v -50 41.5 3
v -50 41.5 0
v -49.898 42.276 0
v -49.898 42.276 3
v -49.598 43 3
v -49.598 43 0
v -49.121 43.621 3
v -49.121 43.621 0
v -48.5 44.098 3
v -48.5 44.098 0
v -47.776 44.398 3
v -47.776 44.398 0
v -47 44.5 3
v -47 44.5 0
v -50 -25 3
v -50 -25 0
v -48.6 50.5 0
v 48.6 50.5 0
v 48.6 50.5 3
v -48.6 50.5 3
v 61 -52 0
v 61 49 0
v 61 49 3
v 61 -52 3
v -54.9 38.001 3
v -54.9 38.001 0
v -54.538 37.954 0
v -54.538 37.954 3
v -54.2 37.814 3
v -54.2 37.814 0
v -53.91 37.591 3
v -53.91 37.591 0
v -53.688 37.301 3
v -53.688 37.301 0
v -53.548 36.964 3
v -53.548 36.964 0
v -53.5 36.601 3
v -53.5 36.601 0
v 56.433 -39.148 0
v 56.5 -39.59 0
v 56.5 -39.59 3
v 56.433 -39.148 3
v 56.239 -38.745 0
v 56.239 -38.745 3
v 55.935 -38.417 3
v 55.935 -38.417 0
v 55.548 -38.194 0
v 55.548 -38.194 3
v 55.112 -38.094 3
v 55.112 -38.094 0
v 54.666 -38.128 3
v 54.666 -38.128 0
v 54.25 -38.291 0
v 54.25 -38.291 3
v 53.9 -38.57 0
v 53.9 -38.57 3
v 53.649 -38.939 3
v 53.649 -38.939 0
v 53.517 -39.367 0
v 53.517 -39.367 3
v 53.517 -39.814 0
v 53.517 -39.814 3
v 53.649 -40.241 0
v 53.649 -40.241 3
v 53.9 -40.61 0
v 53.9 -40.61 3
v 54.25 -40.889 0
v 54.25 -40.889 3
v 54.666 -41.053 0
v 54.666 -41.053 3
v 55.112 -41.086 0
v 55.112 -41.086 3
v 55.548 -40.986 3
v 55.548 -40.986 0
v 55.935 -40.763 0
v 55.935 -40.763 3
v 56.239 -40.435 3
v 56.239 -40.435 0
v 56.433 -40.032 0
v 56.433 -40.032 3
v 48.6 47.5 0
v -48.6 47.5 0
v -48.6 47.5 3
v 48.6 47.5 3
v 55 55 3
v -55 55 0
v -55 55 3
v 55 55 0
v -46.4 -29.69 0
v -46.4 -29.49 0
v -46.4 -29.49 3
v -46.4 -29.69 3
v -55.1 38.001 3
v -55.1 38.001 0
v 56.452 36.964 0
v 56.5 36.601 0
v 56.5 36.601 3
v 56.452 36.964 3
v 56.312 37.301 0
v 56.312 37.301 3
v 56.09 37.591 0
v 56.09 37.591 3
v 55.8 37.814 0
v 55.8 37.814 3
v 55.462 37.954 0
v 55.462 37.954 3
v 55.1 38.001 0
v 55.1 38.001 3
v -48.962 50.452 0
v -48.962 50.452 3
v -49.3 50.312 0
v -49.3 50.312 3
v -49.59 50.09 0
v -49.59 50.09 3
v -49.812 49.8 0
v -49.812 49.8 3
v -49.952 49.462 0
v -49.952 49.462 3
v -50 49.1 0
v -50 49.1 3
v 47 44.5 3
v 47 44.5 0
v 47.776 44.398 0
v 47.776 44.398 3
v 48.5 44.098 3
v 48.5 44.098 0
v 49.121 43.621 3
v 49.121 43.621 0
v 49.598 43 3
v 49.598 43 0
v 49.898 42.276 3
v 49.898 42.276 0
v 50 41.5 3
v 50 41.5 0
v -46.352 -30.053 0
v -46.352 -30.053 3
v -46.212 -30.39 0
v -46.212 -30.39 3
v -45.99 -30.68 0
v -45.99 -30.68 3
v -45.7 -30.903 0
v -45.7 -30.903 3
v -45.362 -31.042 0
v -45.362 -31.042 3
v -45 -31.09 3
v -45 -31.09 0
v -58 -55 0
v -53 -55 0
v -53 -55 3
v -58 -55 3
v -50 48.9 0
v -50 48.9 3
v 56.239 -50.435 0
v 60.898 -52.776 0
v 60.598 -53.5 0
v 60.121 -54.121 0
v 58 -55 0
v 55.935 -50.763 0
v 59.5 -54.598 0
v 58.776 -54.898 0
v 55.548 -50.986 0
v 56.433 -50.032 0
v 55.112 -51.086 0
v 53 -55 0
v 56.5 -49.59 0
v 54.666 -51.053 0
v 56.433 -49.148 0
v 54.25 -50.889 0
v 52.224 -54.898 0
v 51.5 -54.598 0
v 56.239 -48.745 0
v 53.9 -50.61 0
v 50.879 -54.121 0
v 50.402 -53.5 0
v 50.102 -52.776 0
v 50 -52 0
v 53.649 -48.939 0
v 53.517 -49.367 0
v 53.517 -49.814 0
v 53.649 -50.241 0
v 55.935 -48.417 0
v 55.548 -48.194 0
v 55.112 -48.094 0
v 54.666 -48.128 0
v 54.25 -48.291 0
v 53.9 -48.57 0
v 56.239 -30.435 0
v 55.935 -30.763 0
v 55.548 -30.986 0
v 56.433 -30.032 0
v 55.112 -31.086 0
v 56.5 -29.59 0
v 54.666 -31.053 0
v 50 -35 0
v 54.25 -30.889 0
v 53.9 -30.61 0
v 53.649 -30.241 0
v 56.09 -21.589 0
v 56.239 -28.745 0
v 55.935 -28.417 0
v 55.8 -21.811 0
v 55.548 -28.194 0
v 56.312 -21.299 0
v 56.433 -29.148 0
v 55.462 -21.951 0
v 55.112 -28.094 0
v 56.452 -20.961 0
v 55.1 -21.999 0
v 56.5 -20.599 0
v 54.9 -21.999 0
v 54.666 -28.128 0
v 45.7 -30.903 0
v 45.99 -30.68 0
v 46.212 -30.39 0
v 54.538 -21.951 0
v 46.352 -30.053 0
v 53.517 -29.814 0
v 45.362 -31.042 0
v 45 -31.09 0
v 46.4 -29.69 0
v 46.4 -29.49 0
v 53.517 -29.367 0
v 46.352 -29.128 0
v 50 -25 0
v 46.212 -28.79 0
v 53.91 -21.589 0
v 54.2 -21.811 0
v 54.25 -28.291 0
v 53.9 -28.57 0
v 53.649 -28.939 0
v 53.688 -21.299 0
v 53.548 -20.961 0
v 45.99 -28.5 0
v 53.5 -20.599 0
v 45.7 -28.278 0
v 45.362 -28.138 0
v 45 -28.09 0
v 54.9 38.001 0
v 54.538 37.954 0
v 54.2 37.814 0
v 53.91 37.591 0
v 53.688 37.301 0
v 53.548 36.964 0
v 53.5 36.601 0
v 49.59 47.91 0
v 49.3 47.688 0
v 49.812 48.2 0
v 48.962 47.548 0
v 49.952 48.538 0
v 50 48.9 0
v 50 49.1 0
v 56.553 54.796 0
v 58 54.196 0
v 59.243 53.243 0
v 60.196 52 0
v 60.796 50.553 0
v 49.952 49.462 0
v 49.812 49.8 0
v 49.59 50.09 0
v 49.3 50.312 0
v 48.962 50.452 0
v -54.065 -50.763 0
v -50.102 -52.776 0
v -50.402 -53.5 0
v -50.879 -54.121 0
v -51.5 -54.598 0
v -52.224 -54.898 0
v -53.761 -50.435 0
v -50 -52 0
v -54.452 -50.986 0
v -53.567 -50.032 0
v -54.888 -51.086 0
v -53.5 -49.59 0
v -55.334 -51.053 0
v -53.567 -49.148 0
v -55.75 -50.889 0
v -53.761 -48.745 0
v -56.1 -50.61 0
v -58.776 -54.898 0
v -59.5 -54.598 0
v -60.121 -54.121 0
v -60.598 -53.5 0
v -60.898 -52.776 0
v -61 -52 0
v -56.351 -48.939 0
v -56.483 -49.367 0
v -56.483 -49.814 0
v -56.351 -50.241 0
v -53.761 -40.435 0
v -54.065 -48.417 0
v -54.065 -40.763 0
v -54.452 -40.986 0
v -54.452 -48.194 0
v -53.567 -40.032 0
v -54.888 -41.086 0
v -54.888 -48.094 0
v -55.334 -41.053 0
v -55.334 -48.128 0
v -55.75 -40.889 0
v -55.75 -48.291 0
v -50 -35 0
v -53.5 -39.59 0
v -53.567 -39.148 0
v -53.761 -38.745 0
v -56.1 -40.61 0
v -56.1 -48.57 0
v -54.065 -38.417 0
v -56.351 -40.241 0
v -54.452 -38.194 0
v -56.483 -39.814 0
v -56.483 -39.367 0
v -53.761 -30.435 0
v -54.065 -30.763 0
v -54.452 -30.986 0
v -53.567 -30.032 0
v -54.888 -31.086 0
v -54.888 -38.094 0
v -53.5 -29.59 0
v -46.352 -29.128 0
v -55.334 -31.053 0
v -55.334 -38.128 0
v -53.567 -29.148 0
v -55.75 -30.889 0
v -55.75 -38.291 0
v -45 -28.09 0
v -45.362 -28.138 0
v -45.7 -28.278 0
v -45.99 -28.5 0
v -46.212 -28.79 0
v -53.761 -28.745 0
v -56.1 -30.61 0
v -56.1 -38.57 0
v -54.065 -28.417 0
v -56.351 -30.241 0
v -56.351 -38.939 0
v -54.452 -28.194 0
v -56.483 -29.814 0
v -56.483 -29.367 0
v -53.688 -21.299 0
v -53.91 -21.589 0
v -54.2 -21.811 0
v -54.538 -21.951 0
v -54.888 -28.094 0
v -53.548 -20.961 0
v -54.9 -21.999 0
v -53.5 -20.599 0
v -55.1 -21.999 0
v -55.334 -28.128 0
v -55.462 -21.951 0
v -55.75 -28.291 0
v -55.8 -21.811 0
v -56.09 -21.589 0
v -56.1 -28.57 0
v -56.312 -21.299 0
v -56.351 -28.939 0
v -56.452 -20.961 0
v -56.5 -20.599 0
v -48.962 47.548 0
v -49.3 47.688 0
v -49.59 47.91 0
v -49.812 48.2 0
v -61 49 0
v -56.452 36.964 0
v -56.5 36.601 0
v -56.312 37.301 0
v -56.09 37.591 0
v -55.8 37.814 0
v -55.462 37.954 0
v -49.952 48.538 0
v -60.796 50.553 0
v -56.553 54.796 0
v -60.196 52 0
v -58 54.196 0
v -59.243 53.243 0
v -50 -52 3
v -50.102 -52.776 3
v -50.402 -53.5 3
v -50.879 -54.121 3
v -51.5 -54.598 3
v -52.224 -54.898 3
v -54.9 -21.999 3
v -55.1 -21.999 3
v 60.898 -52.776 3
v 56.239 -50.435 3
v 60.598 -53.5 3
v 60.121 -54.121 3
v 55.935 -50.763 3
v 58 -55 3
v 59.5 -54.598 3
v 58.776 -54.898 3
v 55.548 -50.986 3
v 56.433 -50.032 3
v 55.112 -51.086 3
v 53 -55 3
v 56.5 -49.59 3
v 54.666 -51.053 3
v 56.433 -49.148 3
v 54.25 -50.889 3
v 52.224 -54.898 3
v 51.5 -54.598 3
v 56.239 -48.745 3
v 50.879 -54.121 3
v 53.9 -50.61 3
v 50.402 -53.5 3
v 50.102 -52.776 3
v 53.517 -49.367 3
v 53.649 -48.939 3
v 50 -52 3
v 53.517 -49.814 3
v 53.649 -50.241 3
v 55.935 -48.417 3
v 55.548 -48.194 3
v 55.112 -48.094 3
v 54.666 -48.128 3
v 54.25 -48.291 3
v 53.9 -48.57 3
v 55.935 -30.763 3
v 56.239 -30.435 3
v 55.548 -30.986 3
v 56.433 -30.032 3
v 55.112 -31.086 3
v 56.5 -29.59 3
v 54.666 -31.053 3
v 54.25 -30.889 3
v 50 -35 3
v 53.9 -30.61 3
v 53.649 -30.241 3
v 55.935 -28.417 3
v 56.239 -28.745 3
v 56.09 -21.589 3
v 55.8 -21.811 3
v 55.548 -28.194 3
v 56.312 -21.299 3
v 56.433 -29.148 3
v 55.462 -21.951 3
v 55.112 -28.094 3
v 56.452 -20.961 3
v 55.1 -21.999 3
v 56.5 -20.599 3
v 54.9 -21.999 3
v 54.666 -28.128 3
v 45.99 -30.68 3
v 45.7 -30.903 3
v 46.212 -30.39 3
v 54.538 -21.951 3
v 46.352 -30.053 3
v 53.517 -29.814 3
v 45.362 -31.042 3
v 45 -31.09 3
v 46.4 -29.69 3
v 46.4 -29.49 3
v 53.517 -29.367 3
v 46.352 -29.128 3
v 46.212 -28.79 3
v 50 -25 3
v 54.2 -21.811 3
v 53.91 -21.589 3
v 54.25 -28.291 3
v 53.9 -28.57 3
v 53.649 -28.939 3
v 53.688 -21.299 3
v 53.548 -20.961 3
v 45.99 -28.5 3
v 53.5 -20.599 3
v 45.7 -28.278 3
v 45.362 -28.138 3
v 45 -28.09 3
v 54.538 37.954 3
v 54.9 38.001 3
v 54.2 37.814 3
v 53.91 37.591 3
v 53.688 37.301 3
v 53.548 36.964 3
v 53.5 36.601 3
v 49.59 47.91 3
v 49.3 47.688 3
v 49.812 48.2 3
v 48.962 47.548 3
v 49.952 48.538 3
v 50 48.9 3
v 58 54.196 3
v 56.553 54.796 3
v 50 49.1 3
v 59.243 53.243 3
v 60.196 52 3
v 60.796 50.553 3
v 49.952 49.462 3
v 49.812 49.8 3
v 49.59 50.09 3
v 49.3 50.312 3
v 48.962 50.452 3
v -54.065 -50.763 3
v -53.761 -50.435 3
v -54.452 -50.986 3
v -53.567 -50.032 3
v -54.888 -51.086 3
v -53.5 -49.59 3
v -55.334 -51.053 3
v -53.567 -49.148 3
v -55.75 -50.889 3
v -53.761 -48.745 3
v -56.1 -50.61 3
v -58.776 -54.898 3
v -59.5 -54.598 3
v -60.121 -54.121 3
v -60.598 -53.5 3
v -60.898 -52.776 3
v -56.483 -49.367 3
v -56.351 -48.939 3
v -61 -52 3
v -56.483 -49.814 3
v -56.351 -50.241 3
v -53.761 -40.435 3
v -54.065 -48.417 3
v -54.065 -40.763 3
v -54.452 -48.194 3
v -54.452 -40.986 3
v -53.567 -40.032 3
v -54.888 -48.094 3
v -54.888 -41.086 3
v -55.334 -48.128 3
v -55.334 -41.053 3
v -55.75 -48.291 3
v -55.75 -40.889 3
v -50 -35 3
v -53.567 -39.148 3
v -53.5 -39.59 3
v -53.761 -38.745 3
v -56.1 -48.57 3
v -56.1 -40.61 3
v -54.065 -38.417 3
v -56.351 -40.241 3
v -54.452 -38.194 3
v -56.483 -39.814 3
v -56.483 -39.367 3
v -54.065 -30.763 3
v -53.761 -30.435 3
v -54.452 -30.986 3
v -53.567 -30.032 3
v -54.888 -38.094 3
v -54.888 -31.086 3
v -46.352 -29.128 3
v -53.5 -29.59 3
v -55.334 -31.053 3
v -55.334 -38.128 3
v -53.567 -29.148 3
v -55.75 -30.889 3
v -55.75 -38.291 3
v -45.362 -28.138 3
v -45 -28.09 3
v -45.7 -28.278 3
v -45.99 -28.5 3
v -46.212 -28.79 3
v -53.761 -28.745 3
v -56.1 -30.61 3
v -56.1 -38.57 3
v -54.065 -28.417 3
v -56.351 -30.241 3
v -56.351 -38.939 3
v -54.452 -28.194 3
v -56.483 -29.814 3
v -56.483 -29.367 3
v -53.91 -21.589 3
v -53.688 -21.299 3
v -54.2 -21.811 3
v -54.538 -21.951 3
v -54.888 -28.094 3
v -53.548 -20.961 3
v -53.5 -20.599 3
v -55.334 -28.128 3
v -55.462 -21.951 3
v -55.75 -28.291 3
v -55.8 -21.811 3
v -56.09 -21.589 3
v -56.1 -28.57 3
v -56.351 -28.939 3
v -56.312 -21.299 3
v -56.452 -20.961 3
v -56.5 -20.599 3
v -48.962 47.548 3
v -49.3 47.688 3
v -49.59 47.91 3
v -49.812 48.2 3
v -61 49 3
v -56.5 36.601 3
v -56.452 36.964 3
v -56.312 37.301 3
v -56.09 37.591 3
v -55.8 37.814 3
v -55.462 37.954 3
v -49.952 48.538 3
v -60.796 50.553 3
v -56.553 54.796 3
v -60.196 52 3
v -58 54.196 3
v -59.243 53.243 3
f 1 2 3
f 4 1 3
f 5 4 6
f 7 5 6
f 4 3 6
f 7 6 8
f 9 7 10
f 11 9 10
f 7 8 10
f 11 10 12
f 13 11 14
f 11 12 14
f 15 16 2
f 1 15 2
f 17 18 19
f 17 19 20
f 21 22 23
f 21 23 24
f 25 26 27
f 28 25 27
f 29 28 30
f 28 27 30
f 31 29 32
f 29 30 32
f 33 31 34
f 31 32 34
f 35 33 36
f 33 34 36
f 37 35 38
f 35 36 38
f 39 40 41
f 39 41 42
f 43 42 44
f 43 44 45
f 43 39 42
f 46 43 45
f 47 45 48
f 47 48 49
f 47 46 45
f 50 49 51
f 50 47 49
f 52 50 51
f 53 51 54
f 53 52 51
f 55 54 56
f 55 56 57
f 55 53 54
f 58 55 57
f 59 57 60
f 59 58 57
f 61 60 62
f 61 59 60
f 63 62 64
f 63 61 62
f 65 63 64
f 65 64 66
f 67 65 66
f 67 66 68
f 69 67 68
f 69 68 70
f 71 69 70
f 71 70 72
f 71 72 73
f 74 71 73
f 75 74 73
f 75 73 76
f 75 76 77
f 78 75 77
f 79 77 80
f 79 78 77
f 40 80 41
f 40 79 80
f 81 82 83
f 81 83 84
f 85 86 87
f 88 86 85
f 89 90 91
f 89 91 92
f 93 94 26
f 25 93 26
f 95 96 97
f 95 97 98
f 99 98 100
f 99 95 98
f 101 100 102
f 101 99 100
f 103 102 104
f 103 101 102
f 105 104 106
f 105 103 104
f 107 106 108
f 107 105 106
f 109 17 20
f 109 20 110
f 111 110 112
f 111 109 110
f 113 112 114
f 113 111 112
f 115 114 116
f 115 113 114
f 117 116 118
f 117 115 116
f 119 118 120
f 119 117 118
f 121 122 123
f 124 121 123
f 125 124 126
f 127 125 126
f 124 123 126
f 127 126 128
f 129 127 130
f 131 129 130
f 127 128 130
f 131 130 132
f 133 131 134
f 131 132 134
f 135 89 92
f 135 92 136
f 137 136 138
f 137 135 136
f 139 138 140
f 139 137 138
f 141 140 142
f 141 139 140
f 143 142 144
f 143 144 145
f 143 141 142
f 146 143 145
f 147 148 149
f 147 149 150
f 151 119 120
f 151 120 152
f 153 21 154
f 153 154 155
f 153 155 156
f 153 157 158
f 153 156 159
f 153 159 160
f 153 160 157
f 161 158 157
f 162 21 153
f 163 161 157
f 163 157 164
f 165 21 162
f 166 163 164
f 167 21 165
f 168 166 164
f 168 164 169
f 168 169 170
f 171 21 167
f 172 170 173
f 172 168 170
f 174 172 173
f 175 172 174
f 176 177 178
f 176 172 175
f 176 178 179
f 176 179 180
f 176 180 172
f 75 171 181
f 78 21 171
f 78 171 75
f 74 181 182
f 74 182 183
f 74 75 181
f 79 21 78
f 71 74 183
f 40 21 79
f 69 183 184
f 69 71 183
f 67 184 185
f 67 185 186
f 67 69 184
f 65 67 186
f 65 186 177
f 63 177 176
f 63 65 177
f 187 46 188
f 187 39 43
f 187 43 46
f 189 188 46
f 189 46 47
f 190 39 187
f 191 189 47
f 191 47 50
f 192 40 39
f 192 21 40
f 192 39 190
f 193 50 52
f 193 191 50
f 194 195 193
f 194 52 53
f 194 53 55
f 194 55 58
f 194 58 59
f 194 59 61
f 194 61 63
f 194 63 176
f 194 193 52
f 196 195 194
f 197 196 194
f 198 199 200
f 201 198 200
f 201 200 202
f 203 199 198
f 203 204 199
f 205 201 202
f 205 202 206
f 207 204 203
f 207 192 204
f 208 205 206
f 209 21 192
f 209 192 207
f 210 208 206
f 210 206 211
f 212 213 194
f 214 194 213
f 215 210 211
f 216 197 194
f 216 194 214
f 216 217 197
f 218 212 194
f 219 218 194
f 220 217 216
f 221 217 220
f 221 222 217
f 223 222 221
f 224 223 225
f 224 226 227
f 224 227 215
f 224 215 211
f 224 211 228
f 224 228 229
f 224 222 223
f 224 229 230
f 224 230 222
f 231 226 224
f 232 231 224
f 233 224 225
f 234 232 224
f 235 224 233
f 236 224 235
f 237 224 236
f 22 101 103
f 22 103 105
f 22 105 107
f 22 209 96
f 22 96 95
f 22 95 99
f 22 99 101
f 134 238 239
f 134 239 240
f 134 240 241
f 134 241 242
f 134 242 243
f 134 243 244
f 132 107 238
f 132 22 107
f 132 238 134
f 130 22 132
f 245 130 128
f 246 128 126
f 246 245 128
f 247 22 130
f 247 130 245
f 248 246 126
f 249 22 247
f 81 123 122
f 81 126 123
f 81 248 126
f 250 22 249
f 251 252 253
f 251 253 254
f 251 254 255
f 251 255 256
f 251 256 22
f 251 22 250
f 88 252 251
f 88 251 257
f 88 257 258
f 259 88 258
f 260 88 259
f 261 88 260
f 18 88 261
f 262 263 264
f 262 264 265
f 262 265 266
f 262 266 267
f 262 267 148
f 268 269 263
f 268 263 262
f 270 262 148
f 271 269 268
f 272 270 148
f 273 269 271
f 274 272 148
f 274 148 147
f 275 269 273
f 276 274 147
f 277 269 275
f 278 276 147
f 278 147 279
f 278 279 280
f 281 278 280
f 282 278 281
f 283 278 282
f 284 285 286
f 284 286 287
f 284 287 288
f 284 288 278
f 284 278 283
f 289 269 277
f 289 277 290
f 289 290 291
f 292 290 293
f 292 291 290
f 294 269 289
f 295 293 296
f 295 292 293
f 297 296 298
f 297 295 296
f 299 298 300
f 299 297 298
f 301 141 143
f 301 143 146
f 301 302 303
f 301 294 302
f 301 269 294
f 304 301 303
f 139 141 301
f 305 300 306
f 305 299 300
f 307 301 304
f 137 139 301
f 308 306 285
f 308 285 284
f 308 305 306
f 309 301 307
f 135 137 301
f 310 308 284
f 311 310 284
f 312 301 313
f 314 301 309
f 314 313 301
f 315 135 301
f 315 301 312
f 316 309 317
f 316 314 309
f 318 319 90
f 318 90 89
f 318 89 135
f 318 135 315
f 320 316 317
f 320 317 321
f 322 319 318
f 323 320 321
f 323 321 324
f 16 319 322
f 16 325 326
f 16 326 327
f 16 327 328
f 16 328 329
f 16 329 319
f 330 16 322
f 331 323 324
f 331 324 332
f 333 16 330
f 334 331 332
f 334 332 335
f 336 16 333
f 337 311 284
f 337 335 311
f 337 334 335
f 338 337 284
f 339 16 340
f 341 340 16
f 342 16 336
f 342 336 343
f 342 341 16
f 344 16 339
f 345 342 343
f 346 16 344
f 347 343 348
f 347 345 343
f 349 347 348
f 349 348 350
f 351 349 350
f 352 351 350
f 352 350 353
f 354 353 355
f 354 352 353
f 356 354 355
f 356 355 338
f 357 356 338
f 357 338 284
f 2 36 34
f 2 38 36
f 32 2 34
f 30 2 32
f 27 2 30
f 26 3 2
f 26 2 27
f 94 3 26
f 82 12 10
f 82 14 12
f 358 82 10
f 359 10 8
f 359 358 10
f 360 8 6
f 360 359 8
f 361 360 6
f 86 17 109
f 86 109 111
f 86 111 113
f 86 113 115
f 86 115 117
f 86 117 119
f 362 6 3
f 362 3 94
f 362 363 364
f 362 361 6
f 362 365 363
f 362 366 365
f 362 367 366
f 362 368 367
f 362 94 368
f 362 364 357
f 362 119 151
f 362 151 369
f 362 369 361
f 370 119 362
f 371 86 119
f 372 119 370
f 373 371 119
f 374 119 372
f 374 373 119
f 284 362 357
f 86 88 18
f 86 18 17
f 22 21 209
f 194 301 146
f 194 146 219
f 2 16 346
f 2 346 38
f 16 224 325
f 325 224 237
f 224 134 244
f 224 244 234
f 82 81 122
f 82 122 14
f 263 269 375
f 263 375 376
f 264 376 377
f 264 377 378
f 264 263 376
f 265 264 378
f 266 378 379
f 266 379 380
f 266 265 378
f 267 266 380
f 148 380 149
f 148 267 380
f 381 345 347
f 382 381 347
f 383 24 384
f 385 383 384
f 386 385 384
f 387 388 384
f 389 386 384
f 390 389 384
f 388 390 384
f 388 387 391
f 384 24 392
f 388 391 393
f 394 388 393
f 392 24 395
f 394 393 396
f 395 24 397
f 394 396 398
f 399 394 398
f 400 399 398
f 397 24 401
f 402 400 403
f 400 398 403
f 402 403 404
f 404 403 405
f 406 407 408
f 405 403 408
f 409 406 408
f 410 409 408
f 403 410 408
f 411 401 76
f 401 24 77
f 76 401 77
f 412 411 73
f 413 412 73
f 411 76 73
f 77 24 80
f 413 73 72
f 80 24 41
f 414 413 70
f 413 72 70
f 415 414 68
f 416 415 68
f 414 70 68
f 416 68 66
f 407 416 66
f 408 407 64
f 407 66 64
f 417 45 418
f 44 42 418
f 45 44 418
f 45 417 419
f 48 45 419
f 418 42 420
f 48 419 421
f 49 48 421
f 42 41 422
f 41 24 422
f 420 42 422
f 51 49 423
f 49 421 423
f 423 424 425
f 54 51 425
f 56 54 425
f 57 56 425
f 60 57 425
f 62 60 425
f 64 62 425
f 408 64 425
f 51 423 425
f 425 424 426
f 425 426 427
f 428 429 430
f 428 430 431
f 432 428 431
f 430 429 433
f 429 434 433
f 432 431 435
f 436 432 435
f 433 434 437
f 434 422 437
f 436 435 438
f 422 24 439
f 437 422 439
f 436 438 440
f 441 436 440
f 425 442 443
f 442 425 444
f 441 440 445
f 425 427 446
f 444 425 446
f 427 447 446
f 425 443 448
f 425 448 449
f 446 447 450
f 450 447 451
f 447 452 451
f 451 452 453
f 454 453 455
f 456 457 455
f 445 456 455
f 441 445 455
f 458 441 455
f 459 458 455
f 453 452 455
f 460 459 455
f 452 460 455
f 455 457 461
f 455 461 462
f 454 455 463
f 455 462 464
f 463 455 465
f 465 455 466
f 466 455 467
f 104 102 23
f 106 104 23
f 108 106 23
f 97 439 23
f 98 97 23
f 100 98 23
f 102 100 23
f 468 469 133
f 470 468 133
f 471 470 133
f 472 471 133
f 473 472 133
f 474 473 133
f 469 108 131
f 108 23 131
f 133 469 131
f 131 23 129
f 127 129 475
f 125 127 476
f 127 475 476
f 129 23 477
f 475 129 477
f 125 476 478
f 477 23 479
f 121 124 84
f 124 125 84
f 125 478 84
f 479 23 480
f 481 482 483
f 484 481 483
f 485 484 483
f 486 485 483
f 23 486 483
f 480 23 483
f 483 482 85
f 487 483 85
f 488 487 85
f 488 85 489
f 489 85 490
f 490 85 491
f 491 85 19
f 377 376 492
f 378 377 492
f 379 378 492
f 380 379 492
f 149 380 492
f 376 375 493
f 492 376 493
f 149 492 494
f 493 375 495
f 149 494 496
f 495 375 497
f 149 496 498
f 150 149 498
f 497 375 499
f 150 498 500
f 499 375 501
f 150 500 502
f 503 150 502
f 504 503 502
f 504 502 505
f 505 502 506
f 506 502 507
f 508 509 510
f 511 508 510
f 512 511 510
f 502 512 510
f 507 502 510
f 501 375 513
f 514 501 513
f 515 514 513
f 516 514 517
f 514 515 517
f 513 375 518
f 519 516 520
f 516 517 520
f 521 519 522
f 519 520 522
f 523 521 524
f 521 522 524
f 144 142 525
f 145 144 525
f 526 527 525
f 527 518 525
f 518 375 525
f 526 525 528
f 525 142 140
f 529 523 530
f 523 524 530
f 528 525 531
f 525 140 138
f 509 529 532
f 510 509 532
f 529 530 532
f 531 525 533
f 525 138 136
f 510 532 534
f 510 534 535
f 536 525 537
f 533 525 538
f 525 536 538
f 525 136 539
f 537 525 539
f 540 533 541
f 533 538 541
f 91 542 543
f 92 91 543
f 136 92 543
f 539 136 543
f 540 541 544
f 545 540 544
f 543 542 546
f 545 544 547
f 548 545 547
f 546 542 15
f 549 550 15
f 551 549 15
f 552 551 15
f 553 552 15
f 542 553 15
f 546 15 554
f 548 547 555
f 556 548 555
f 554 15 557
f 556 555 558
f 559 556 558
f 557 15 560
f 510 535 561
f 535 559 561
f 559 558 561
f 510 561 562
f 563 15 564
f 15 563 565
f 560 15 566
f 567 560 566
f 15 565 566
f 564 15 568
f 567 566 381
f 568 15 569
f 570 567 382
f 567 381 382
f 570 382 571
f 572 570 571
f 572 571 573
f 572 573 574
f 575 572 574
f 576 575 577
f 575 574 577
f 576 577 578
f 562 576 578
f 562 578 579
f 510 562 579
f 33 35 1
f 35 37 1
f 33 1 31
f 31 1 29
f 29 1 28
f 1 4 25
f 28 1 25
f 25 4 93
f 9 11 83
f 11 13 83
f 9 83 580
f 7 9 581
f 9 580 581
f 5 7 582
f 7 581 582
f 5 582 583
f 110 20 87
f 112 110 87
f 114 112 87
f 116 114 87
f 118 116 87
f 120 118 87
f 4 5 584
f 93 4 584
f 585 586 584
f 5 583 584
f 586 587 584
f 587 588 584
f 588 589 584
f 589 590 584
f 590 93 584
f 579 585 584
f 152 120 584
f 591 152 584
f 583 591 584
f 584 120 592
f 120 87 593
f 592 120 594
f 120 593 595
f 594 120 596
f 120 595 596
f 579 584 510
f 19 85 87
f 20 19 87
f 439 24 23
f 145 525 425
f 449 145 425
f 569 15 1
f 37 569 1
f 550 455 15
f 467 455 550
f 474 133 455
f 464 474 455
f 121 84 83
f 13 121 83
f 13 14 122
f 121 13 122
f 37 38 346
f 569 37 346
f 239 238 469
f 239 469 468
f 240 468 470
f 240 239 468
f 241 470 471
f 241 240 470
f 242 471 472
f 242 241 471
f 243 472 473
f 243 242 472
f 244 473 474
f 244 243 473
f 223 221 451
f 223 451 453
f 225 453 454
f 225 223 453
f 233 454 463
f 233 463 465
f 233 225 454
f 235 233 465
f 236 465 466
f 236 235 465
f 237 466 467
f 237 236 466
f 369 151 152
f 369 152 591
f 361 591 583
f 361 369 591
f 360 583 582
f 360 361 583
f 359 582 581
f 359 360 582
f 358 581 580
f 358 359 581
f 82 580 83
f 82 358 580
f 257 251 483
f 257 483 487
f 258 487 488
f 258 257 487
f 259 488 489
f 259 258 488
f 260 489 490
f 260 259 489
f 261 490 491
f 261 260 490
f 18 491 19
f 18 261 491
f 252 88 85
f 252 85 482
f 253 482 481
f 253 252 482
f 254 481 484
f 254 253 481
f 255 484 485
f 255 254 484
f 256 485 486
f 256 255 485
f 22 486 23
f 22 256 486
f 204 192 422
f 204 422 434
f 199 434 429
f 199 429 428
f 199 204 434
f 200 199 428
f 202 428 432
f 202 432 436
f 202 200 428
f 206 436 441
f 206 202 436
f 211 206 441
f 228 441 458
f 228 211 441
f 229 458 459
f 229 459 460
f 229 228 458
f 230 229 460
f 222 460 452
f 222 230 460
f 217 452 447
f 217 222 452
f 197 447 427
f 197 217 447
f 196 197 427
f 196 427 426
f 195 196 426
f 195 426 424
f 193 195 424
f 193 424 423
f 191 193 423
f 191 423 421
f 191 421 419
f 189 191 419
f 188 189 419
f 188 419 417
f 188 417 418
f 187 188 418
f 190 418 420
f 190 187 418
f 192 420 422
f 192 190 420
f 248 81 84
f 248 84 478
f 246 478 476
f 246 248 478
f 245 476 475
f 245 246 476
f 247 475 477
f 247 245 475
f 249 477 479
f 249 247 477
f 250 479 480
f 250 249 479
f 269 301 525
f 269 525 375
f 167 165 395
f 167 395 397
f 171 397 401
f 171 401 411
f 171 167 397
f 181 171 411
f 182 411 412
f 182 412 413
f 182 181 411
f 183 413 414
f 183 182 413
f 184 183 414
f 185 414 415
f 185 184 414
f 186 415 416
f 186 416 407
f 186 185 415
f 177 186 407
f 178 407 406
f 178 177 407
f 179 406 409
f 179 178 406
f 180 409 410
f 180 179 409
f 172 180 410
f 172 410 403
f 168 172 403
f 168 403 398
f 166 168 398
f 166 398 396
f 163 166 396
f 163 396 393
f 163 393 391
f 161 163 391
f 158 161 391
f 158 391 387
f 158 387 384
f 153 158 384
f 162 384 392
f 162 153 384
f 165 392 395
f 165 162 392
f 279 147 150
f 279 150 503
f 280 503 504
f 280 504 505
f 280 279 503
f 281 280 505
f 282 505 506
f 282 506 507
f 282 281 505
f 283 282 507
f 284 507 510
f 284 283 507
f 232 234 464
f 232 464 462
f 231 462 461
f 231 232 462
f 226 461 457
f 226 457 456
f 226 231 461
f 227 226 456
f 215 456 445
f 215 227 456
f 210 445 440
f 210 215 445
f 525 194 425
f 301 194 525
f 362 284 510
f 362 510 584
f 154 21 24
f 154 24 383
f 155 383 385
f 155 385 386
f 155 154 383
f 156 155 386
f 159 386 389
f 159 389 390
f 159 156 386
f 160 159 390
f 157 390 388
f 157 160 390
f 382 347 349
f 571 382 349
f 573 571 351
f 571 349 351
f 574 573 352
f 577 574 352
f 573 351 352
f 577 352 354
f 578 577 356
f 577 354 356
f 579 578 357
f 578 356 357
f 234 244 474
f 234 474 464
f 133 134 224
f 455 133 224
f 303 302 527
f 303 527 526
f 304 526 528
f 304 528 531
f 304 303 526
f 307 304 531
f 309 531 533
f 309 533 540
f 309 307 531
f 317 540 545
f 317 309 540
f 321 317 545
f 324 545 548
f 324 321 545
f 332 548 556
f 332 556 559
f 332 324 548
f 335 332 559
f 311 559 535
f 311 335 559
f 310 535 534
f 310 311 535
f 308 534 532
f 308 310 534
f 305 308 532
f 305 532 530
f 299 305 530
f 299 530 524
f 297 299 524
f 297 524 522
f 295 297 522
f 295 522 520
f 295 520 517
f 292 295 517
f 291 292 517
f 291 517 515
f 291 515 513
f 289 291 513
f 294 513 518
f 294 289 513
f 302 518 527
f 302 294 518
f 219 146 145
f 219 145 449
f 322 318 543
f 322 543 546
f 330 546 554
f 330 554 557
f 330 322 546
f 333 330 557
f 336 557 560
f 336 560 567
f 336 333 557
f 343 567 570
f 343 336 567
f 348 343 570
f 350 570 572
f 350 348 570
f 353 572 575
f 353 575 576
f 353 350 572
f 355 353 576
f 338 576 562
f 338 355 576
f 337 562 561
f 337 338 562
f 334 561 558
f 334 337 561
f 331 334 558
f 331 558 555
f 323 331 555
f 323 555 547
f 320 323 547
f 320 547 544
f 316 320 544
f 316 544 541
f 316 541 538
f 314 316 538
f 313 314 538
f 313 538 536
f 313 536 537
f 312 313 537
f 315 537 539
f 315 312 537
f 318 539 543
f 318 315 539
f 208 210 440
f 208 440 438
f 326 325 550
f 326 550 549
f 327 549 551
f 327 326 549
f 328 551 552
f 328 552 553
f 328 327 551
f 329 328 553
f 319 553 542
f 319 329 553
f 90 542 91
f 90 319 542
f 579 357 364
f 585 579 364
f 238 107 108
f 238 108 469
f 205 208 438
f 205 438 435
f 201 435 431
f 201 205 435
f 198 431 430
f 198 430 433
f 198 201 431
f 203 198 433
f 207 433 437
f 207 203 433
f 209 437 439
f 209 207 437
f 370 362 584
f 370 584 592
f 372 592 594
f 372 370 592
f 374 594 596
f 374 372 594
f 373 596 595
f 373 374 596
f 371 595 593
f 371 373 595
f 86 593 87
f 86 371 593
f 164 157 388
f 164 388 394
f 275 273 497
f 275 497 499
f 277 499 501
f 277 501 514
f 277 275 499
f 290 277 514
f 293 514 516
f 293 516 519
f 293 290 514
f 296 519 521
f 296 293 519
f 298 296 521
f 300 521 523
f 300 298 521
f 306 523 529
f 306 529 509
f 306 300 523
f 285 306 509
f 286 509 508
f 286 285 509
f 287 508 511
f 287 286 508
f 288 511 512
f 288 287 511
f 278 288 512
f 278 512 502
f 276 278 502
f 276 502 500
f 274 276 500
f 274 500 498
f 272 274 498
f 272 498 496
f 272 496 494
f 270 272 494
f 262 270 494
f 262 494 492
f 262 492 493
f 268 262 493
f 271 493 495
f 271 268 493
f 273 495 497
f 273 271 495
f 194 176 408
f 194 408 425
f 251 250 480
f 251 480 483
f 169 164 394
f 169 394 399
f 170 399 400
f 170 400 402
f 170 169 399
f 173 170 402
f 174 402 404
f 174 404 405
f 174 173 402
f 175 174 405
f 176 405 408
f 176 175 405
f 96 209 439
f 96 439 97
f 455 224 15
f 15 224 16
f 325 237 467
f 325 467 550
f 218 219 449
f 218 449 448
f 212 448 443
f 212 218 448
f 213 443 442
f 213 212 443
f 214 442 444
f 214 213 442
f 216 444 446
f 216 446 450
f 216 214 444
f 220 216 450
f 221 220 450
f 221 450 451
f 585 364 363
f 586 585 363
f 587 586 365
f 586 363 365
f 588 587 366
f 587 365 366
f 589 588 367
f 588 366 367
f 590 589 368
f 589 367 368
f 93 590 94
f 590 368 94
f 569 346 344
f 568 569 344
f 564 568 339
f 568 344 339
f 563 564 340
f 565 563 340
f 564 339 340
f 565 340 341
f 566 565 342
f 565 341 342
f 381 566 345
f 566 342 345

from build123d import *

# Parameters (mm, degrees)
SKETCH1_R           = 1.5
BOSS_EXTRUDE1_DEPTH = 3


with BuildPart() as part:
    # Sketch1 → Boss-Extrude1 (new body)
    with BuildSketch(Plane.XY):
        with BuildLine():
            Line((-61, -52), (-61, 49))
            ThreePointArc((-61, 49), (-59.242640687, 53.242640687), (-55, 55))
            Line((-55, 55), (55, 55))
            ThreePointArc((55, 55), (59.242640687, 53.242640687), (61, 49))
            Line((61, 49), (61, -52))
            ThreePointArc((61, -52), (60.121320344, -54.121320344), (58, -55))
            Line((58, -55), (53, -55))
            ThreePointArc((53, -55), (50.878679656, -54.121320344), (50, -52))
            Line((50, -52), (50, -35))
            Line((50, -35), (-50, -35))
            Line((-50, -35), (-50, -52))
            ThreePointArc((-50, -52), (-50.878679656, -54.121320344), (-53, -55))
            Line((-53, -55), (-58, -55))
            ThreePointArc((-58, -55), (-60.121320344, -54.121320344), (-61, -52))
        make_face()
        with Locations((-55, -49.590163934)):
            Circle(SKETCH1_R, mode=Mode.SUBTRACT)
        with Locations((55, -49.590163934)):
            Circle(SKETCH1_R, mode=Mode.SUBTRACT)
        with Locations((-55, -39.590163934)):
            Circle(SKETCH1_R, mode=Mode.SUBTRACT)
        with Locations((-55, -29.590163934)):
            Circle(SKETCH1_R, mode=Mode.SUBTRACT)
        with Locations((55, -39.590163934)):
            Circle(SKETCH1_R, mode=Mode.SUBTRACT)
        with Locations((55, -29.590163934)):
            Circle(SKETCH1_R, mode=Mode.SUBTRACT)
        with BuildLine():
            Line((-47, 44.5), (47, 44.5))
            ThreePointArc((47, 44.5), (49.121320344, 43.621320344), (50, 41.5))
            Line((50, 41.5), (50, -25))
            Line((50, -25), (-50, -25))
            Line((-50, -25), (-50, 41.5))
            ThreePointArc((-50, 41.5), (-49.121320344, 43.621320344), (-47, 44.5))
        make_face(mode=Mode.SUBTRACT)
        with BuildLine():
            Line((48.6, 50.5), (-48.6, 50.5))
            ThreePointArc((-48.6, 50.5), (-49.589949494, 50.089949494), (-50, 49.1))
            Line((-50, 49.1), (-50, 48.9))
            ThreePointArc((-50, 48.9), (-49.589949494, 47.910050506), (-48.6, 47.5))
            Line((-48.6, 47.5), (48.6, 47.5))
            ThreePointArc((48.6, 47.5), (49.589949494, 47.910050506), (50, 48.9))
            Line((50, 48.9), (50, 49.1))
            ThreePointArc((50, 49.1), (49.589949494, 50.089949494), (48.6, 50.5))
        make_face(mode=Mode.SUBTRACT)
        with BuildLine():
            Line((-55.1, 38.001292496), (-54.9, 38.001292496))
            ThreePointArc((-54.9, 38.001292496), (-53.910050506, 37.59124199), (-53.5, 36.601292496))
            Line((-53.5, 36.601292496), (-53.5, -20.598707504))
            ThreePointArc((-53.5, -20.598707504), (-53.910050506, -21.588656998), (-54.9, -21.998707504))
            Line((-54.9, -21.998707504), (-55.1, -21.998707504))
            ThreePointArc((-55.1, -21.998707504), (-56.089949494, -21.588656998), (-56.5, -20.598707504))
            Line((-56.5, -20.598707504), (-56.5, 36.601292496))
            ThreePointArc((-56.5, 36.601292496), (-56.089949494, 37.59124199), (-55.1, 38.001292496))
        make_face(mode=Mode.SUBTRACT)
        with BuildLine():
            Line((55.1, 38.001292496), (54.9, 38.001292496))
            ThreePointArc((54.9, 38.001292496), (53.910050506, 37.59124199), (53.5, 36.601292496))
            Line((53.5, 36.601292496), (53.5, -20.598707504))
            ThreePointArc((53.5, -20.598707504), (53.910050506, -21.588656998), (54.9, -21.998707504))
            Line((54.9, -21.998707504), (55.1, -21.998707504))
            ThreePointArc((55.1, -21.998707504), (56.089949494, -21.588656998), (56.5, -20.598707504))
            Line((56.5, -20.598707504), (56.5, 36.601292496))
            ThreePointArc((56.5, 36.601292496), (56.089949494, 37.59124199), (55.1, 38.001292496))
        make_face(mode=Mode.SUBTRACT)
        with BuildLine():
            Line((45, -28.090163934), (-45, -28.090163934))
            ThreePointArc((-45, -28.090163934), (-45.989949494, -28.500214441), (-46.4, -29.490163934))
            Line((-46.4, -29.490163934), (-46.4, -29.690163934))
            ThreePointArc((-46.4, -29.690163934), (-45.989949494, -30.680113428), (-45, -31.090163934))
            Line((-45, -31.090163934), (45, -31.090163934))
            ThreePointArc((45, -31.090163934), (45.989949494, -30.680113428), (46.4, -29.690163934))
            Line((46.4, -29.690163934), (46.4, -29.490163934))
            ThreePointArc((46.4, -29.490163934), (45.989949494, -28.500214441), (45, -28.090163934))
        make_face(mode=Mode.SUBTRACT)
    extrude(amount=BOSS_EXTRUDE1_DEPTH)


solid = part.part
